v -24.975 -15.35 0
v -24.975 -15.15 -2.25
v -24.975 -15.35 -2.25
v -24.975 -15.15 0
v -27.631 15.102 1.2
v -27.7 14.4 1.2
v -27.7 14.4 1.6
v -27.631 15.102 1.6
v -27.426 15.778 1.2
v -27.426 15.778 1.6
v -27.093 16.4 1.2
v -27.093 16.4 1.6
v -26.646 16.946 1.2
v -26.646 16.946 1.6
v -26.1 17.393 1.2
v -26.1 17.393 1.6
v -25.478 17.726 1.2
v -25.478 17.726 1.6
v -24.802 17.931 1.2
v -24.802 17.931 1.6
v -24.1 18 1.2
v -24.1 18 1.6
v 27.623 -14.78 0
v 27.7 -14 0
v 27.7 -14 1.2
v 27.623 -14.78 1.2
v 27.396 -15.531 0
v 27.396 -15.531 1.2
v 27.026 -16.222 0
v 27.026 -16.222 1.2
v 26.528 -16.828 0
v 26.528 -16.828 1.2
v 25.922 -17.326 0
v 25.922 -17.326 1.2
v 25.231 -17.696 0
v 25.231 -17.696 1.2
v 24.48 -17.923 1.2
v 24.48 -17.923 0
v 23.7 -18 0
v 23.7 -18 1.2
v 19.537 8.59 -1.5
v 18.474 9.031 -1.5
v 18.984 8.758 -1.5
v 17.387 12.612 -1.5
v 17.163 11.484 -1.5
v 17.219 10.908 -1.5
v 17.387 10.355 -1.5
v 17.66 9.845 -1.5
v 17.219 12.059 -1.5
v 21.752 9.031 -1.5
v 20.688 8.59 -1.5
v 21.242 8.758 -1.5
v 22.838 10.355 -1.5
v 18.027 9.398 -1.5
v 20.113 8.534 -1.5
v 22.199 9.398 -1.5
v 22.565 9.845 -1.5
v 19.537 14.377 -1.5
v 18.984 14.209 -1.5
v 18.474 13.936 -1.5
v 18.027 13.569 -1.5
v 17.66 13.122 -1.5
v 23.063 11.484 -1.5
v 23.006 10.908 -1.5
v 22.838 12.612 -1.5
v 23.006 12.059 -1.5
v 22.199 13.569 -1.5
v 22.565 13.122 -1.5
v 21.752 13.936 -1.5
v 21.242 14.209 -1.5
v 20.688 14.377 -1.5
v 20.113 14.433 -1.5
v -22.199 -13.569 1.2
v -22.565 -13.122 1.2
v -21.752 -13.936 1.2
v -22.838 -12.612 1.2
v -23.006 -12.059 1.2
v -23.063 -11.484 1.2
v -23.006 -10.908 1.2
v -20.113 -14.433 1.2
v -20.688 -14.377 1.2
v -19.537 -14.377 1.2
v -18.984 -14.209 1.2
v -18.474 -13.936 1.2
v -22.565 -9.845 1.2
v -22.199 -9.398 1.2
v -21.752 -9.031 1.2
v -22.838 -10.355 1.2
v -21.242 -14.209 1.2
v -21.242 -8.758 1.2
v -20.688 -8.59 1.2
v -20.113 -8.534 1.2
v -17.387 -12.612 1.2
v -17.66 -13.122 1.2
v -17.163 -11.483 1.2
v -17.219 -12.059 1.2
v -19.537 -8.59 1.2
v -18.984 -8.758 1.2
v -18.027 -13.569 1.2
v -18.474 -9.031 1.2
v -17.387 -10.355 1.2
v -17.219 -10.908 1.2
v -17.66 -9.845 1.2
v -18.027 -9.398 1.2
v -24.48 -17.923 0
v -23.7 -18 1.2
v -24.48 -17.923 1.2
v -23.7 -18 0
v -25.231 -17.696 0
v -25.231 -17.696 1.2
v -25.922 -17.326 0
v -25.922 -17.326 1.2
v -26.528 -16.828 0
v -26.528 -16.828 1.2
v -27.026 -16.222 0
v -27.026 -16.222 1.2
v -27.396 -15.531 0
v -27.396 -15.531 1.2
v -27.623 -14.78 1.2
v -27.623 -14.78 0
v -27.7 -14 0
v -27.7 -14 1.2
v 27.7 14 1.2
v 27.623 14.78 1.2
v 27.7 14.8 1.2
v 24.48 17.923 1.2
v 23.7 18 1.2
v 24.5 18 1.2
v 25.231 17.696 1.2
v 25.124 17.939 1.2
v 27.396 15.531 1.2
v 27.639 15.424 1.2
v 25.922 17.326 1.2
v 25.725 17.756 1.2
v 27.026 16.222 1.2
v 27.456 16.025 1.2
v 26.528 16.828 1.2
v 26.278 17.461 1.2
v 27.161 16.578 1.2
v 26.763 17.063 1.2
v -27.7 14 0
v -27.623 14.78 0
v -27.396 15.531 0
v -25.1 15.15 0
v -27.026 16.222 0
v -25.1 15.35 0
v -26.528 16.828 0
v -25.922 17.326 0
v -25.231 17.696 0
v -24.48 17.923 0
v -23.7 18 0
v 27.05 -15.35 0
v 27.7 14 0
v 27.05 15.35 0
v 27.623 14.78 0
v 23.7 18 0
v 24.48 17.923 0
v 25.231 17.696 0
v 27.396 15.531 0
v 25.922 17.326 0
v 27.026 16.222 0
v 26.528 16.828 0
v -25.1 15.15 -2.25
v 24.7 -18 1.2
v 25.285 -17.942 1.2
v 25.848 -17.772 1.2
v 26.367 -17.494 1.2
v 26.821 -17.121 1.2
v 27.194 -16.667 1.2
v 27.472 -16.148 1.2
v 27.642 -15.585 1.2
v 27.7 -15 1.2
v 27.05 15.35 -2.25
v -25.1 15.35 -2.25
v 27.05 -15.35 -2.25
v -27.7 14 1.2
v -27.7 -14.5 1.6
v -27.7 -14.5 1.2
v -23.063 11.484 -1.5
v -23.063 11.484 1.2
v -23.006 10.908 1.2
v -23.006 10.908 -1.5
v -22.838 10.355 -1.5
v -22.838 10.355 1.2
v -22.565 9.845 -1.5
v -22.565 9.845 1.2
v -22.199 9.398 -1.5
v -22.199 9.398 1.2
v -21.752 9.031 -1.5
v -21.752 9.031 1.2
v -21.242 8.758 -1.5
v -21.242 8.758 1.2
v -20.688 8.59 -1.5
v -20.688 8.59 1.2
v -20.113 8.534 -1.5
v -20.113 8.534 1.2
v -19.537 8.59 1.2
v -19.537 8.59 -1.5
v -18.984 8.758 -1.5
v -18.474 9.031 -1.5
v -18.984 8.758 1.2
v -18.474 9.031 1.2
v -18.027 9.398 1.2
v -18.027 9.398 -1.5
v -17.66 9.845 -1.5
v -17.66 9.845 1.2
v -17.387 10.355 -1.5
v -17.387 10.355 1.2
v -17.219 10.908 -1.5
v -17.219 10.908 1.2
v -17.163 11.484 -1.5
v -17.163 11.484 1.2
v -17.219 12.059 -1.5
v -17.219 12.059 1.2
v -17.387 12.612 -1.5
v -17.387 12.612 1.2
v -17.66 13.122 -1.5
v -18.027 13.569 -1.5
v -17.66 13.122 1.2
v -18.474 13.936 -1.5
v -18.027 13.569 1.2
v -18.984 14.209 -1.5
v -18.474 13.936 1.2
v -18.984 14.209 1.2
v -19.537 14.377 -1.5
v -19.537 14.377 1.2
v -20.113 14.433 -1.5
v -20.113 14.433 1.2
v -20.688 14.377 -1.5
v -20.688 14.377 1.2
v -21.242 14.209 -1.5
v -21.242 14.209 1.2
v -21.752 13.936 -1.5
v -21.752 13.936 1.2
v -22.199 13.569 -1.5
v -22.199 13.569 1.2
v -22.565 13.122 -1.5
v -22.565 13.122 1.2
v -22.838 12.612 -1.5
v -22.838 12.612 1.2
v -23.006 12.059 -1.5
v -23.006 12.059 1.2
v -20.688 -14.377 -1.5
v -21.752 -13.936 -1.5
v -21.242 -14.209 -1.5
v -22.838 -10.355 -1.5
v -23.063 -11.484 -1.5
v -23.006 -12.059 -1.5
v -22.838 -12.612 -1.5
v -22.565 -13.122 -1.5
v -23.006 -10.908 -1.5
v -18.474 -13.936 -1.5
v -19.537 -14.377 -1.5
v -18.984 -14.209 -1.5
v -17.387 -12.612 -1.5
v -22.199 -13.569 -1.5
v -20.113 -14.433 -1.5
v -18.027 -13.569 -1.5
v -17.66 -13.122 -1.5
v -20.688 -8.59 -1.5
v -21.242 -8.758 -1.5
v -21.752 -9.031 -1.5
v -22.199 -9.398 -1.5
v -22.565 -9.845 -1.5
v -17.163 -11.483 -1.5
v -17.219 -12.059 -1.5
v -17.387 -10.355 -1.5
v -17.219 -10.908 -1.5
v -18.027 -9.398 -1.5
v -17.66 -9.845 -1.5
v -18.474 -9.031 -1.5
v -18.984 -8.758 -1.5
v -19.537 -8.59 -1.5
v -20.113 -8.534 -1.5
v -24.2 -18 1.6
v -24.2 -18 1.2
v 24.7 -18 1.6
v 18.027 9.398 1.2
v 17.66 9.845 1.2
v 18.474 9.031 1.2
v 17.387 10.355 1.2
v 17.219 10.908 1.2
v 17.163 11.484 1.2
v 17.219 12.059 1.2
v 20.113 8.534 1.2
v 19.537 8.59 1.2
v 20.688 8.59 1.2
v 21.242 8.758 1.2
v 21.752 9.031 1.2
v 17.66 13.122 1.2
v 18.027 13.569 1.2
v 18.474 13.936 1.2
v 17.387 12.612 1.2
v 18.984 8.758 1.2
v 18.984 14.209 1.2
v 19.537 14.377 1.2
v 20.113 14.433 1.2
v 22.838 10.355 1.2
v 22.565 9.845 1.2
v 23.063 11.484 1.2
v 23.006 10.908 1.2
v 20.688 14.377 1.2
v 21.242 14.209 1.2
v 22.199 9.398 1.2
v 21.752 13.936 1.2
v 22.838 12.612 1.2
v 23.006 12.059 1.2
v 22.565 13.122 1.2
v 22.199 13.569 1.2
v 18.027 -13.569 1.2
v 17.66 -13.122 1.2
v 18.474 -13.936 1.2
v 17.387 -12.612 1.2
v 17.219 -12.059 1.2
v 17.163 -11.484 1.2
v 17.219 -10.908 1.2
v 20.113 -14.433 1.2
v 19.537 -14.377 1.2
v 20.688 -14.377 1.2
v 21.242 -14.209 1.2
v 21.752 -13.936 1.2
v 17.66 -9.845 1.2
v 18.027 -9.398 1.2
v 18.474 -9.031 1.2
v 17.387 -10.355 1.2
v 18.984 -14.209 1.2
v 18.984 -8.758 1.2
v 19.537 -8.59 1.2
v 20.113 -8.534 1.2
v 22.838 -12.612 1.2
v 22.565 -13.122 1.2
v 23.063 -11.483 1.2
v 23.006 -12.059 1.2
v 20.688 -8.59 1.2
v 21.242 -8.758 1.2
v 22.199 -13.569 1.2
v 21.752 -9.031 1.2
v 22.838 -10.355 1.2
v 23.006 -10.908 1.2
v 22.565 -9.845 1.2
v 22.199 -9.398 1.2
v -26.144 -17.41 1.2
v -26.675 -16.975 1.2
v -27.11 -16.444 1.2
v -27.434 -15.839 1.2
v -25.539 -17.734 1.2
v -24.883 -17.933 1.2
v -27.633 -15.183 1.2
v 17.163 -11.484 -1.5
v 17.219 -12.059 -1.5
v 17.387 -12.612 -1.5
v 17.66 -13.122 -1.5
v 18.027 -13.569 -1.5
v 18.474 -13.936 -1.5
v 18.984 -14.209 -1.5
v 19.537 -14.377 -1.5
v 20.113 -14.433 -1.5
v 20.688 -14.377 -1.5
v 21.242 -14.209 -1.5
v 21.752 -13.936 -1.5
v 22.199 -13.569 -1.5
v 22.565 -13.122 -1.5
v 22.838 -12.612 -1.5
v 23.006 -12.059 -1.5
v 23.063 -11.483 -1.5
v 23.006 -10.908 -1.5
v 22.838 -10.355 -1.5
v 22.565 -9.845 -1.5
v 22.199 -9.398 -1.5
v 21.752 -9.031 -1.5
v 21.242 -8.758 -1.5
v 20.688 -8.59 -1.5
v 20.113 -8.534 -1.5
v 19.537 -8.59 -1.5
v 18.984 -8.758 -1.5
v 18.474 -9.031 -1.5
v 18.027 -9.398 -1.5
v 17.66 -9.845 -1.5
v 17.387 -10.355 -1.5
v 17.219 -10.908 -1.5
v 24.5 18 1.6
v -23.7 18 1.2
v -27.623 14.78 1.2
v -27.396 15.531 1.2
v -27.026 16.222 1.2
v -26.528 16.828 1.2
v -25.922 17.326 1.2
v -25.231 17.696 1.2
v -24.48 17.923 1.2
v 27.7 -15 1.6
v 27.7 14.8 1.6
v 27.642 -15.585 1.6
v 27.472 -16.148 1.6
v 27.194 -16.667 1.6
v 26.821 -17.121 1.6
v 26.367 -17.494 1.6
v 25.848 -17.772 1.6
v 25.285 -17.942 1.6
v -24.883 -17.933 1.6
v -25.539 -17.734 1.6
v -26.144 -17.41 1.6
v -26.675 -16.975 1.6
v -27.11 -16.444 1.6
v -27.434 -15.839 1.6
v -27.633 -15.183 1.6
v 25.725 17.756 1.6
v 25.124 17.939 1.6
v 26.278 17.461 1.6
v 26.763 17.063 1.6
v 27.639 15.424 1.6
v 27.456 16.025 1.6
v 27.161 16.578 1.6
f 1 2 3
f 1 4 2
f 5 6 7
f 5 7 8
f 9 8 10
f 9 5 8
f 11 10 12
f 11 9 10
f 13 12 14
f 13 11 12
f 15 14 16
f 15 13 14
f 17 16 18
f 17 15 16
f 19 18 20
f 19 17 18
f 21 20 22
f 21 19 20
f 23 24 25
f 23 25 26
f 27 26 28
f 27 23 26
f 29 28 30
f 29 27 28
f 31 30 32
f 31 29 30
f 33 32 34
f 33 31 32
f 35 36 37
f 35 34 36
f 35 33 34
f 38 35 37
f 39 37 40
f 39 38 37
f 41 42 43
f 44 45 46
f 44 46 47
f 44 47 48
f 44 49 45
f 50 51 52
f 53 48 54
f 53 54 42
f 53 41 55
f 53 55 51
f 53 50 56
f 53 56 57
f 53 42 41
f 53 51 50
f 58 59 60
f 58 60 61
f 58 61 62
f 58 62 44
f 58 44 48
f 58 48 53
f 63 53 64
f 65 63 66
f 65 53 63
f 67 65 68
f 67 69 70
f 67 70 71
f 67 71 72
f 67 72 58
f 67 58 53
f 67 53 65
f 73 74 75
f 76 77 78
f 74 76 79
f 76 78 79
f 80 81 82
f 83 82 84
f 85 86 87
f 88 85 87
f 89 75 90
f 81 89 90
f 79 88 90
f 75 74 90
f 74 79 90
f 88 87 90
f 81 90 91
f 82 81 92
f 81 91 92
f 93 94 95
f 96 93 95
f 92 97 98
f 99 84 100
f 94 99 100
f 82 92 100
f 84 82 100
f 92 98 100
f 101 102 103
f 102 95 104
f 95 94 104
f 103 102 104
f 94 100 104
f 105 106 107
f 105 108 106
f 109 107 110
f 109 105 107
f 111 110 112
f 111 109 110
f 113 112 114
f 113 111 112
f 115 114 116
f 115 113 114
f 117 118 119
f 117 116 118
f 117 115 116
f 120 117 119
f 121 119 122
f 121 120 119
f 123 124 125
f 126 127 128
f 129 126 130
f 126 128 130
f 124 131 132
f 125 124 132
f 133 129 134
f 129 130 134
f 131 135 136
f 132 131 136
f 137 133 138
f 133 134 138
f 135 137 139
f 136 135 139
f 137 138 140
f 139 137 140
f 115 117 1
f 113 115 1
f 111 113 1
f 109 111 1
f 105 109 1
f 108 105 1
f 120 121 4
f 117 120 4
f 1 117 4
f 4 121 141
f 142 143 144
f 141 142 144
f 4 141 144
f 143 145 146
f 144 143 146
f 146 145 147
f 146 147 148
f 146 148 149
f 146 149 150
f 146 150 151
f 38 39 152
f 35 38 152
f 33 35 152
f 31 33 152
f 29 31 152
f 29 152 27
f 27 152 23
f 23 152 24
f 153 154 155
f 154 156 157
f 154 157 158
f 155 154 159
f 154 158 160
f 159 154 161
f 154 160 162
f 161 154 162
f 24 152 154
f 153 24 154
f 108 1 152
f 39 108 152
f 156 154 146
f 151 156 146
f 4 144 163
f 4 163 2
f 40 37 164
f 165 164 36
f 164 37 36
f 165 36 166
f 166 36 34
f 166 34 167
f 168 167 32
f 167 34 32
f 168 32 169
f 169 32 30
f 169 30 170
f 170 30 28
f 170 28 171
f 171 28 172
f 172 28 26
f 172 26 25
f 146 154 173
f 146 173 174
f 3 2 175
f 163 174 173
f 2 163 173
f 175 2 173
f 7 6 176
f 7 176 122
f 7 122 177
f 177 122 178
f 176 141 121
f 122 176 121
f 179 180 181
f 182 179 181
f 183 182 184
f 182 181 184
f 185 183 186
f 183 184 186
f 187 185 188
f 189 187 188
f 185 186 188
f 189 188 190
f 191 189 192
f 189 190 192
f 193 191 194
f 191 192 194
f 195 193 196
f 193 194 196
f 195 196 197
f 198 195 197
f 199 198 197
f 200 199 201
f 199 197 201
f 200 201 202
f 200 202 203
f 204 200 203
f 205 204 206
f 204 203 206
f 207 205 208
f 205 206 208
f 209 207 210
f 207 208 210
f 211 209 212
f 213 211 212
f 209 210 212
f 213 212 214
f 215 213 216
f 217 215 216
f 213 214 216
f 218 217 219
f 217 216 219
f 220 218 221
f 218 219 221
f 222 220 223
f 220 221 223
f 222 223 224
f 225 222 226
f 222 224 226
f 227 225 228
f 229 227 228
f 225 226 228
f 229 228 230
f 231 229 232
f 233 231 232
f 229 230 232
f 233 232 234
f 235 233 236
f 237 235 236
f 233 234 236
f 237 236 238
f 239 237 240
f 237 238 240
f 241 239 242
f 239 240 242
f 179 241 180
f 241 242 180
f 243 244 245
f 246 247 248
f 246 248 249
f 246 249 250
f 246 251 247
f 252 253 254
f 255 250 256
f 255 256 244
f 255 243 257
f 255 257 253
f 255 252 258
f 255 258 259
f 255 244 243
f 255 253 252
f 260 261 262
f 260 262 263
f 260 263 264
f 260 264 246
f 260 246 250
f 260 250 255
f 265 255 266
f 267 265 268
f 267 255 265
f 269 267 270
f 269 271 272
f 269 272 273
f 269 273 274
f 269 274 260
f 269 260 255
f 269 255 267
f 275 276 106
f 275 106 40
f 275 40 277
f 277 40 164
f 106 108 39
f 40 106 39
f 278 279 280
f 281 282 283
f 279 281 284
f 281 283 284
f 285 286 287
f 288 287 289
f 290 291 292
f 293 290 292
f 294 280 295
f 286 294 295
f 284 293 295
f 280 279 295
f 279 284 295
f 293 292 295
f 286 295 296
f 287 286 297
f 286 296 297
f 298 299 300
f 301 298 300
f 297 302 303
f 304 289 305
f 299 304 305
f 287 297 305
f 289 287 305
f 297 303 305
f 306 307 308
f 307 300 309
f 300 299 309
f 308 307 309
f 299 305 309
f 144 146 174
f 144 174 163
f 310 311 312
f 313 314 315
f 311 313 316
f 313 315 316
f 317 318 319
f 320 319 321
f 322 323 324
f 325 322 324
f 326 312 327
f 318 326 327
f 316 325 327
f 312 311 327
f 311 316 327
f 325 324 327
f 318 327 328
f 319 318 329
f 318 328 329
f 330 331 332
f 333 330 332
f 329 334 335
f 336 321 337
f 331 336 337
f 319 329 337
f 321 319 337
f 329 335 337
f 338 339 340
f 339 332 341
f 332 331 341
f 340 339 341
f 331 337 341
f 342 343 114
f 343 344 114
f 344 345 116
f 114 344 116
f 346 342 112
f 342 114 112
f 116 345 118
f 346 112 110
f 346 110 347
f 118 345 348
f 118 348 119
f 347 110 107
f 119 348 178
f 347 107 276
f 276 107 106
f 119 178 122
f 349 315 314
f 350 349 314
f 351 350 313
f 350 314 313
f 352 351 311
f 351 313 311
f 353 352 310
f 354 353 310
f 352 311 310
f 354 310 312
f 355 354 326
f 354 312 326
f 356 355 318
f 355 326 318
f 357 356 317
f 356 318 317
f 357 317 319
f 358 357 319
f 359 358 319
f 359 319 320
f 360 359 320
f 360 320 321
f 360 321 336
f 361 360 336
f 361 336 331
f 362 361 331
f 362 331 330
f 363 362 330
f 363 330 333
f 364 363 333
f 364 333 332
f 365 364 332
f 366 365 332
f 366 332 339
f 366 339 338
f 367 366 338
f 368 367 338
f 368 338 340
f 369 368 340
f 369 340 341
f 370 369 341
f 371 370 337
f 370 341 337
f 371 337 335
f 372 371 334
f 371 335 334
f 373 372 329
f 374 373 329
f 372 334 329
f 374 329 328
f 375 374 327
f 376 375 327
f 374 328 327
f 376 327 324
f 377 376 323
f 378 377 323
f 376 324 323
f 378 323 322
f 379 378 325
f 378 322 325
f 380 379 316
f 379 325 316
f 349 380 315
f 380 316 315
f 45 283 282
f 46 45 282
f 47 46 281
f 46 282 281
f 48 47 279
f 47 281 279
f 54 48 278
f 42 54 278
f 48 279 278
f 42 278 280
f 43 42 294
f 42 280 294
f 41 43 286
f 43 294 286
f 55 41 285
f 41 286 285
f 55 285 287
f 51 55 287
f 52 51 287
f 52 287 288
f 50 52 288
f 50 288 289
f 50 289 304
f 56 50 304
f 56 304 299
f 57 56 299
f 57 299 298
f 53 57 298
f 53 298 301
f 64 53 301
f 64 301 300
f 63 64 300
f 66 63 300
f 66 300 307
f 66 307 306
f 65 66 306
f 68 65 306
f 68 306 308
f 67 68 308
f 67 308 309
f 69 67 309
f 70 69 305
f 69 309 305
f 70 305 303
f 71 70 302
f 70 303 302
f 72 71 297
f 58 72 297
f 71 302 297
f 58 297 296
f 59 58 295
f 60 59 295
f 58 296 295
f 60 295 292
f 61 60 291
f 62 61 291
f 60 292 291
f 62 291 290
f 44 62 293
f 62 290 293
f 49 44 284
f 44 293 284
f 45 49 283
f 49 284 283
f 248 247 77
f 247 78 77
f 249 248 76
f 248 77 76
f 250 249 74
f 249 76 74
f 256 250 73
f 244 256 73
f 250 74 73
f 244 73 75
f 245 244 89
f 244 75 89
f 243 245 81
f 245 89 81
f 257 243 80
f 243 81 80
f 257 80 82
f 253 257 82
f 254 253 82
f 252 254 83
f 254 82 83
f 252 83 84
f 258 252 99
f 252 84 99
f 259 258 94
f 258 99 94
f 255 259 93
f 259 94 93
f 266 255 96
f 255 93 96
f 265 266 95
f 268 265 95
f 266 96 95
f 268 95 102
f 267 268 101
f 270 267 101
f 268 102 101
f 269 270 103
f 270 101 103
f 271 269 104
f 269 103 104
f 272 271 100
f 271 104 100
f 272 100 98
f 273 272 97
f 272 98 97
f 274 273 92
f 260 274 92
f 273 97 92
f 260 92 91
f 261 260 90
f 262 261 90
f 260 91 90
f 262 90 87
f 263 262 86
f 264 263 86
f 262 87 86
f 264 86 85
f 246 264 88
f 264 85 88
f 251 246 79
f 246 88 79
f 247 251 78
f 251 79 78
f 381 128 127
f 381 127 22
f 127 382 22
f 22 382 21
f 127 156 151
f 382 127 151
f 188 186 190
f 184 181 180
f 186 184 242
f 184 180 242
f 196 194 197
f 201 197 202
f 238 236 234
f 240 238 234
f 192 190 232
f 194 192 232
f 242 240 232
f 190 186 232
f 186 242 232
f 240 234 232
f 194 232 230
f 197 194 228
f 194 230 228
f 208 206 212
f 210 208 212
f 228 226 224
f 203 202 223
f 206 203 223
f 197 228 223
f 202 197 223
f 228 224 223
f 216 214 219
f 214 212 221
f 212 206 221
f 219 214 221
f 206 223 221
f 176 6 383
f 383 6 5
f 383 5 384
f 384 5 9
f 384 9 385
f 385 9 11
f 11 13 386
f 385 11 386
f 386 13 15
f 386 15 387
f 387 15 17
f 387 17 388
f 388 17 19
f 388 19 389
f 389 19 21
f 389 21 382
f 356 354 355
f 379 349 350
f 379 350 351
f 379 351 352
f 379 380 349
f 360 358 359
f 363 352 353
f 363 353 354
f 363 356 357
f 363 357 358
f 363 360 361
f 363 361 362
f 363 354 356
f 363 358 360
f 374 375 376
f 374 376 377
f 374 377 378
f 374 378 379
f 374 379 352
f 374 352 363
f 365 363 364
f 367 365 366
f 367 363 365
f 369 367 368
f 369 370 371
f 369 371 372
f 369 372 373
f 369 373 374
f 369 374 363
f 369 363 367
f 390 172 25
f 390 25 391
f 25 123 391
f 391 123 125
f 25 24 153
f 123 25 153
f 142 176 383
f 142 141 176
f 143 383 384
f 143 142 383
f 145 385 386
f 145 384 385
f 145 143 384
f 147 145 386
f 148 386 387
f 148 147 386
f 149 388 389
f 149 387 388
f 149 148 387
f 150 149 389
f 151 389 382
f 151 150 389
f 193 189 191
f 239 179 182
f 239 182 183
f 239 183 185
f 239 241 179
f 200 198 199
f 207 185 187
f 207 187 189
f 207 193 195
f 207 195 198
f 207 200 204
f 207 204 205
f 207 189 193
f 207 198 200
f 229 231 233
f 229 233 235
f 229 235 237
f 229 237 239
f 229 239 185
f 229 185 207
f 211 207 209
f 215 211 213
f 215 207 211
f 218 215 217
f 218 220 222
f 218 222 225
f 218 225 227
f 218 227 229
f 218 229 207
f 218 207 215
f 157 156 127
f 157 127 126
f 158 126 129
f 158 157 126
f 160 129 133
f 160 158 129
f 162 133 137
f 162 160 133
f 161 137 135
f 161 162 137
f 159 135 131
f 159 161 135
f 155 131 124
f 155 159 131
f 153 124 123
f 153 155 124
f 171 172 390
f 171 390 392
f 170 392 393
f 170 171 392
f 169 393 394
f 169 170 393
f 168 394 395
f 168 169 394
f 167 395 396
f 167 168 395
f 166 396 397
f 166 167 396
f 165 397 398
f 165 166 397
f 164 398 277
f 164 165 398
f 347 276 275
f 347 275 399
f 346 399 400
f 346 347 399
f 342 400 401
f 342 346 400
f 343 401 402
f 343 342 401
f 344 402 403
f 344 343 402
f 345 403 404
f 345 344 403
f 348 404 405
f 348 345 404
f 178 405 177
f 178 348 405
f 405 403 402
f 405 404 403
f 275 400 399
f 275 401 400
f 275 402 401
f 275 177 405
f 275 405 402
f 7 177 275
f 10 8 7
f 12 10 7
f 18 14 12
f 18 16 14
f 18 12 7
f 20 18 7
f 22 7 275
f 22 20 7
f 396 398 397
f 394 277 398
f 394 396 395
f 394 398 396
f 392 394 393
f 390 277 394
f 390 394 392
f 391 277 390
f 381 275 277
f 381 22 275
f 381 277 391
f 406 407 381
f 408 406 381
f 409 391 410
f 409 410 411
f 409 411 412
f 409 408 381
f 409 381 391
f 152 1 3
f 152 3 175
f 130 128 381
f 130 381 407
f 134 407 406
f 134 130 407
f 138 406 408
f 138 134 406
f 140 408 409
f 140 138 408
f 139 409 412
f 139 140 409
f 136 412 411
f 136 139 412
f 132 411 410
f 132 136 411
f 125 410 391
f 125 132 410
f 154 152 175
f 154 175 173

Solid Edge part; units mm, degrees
sketch "Sketch1" plane through (0, 0, 0) normal (0, 0, 1) x (1, 0, 0)
  line L0 (-23.7, -18) -> (23.7, -18)
  arc A0 (23.7, -18) -> (27.7, -14) centre (23.7, -14) ccw
  line L1 (27.7, -14) -> (27.7, 14)
  arc A1 (23.7, 18) -> (27.7, 14) centre (23.7, 14) cw
  line L2 (23.7, 18) -> (-23.7, 18)
  arc A2 (-23.7, 18) -> (-27.7, 14) centre (-23.7, 14) ccw
  line L3 (-27.7, 0) -> (-27.7, 14)
  line L4 (-27.7, 0) -> (-27.7, -14)
  arc A3 (-27.7, -14) -> (-23.7, -18) centre (-23.7, -14) ccw
  line L5 (-24.85, -15.15) -> (26.85, -15.15)
  line L6 (26.85, -15.15) -> (26.85, 15.15)
  line L7 (-24.85, 15.15) -> (26.85, 15.15)
  line L8 (-24.85, -15.15) -> (-24.85, 15.15)
  dimension "D1" = 30.3
  dimension "D2" = 51.7
extrude "Protrusion1" add sketch "Sketch1" along normal blind 1.2
sketch "Sketch2" plane through (0, 0, 1.2) normal (0, 0, 1) x (1, 0, 0)
  line L0 (-25.1, 15.15) -> (-24.975, -15.15)
  line L1 (-24.975, -15.15) -> (-24.975, -15.35)
  line L2 (-24.975, -15.35) -> (27.05, -15.35)
  line L3 (27.05, -15.35) -> (27.05, -15.15)
  line L4 (27.05, 15.15) -> (27.05, -15.15)
  line L5 (27.05, 15.15) -> (27.05, 15.35)
  line L6 (27.05, 15.35) -> (-25.1, 15.35)
  line L7 (-25.1, 15.35) -> (-25.1, 15.15)
  dimension "D1" = 0.2
  dimension "D2" = 52.025
  dimension "D3" = 0.2
  dimension "D4" = 0.2
  dimension "D5" = 52.15
  dimension "D6" = 0.2
extrude "Wyciągnięcie_2" add sketch "Sketch2" against normal blind 3.45
sketch "Sketch3" plane through (0, 0, 1.2) normal (0, 0, 1) x (-1, 0, 0)
  circle A0 centre (-20.1126, 11.4835) radius 2.95
  circle A1 centre (20.1126, 11.4835) radius 2.95
  circle A2 centre (20.1126, -11.4835) radius 2.95
  circle A3 centre (-20.1126, -11.4835) radius 2.95
  dimension "D1" = 5.9
extrude "Wycięcie_1" cut sketch "Sketch3" against normal blind 2.7
sketch "Sketch4" plane through (0, 0, 1.2) normal (0, 0, 1) x (-1, 0, 0)
  line L0 (-24.5, -18) -> (24.1, -18)
  arc A0 (27.7, -14.4) -> (24.1, -18) centre (24.1, -14.4) cw
  line L1 (27.7, -14.4) -> (27.7, 14.5)
  arc A1 (24.2, 18) -> (27.7, 14.5) centre (24.2, 14.5) cw
  line L2 (24.2, 18) -> (-24.7, 18)
  arc A2 (-24.7, 18) -> (-27.7, 15) centre (-24.7, 15) ccw
  line L3 (-27.7, 15) -> (-27.7, -14.8)
  arc A3 (-27.7, -14.8) -> (-24.5, -18) centre (-24.5, -14.8) ccw
  dimension "D1" = 48.9
  dimension "D2" = 29.8
  dimension "D3" = 3
  dimension "D4" = 3.2
  dimension "D5" = 3.5
  dimension "D6" = 3.6
extrude "Wyciągnięcie_3" add sketch "Sketch4" along normal blind 0.4
